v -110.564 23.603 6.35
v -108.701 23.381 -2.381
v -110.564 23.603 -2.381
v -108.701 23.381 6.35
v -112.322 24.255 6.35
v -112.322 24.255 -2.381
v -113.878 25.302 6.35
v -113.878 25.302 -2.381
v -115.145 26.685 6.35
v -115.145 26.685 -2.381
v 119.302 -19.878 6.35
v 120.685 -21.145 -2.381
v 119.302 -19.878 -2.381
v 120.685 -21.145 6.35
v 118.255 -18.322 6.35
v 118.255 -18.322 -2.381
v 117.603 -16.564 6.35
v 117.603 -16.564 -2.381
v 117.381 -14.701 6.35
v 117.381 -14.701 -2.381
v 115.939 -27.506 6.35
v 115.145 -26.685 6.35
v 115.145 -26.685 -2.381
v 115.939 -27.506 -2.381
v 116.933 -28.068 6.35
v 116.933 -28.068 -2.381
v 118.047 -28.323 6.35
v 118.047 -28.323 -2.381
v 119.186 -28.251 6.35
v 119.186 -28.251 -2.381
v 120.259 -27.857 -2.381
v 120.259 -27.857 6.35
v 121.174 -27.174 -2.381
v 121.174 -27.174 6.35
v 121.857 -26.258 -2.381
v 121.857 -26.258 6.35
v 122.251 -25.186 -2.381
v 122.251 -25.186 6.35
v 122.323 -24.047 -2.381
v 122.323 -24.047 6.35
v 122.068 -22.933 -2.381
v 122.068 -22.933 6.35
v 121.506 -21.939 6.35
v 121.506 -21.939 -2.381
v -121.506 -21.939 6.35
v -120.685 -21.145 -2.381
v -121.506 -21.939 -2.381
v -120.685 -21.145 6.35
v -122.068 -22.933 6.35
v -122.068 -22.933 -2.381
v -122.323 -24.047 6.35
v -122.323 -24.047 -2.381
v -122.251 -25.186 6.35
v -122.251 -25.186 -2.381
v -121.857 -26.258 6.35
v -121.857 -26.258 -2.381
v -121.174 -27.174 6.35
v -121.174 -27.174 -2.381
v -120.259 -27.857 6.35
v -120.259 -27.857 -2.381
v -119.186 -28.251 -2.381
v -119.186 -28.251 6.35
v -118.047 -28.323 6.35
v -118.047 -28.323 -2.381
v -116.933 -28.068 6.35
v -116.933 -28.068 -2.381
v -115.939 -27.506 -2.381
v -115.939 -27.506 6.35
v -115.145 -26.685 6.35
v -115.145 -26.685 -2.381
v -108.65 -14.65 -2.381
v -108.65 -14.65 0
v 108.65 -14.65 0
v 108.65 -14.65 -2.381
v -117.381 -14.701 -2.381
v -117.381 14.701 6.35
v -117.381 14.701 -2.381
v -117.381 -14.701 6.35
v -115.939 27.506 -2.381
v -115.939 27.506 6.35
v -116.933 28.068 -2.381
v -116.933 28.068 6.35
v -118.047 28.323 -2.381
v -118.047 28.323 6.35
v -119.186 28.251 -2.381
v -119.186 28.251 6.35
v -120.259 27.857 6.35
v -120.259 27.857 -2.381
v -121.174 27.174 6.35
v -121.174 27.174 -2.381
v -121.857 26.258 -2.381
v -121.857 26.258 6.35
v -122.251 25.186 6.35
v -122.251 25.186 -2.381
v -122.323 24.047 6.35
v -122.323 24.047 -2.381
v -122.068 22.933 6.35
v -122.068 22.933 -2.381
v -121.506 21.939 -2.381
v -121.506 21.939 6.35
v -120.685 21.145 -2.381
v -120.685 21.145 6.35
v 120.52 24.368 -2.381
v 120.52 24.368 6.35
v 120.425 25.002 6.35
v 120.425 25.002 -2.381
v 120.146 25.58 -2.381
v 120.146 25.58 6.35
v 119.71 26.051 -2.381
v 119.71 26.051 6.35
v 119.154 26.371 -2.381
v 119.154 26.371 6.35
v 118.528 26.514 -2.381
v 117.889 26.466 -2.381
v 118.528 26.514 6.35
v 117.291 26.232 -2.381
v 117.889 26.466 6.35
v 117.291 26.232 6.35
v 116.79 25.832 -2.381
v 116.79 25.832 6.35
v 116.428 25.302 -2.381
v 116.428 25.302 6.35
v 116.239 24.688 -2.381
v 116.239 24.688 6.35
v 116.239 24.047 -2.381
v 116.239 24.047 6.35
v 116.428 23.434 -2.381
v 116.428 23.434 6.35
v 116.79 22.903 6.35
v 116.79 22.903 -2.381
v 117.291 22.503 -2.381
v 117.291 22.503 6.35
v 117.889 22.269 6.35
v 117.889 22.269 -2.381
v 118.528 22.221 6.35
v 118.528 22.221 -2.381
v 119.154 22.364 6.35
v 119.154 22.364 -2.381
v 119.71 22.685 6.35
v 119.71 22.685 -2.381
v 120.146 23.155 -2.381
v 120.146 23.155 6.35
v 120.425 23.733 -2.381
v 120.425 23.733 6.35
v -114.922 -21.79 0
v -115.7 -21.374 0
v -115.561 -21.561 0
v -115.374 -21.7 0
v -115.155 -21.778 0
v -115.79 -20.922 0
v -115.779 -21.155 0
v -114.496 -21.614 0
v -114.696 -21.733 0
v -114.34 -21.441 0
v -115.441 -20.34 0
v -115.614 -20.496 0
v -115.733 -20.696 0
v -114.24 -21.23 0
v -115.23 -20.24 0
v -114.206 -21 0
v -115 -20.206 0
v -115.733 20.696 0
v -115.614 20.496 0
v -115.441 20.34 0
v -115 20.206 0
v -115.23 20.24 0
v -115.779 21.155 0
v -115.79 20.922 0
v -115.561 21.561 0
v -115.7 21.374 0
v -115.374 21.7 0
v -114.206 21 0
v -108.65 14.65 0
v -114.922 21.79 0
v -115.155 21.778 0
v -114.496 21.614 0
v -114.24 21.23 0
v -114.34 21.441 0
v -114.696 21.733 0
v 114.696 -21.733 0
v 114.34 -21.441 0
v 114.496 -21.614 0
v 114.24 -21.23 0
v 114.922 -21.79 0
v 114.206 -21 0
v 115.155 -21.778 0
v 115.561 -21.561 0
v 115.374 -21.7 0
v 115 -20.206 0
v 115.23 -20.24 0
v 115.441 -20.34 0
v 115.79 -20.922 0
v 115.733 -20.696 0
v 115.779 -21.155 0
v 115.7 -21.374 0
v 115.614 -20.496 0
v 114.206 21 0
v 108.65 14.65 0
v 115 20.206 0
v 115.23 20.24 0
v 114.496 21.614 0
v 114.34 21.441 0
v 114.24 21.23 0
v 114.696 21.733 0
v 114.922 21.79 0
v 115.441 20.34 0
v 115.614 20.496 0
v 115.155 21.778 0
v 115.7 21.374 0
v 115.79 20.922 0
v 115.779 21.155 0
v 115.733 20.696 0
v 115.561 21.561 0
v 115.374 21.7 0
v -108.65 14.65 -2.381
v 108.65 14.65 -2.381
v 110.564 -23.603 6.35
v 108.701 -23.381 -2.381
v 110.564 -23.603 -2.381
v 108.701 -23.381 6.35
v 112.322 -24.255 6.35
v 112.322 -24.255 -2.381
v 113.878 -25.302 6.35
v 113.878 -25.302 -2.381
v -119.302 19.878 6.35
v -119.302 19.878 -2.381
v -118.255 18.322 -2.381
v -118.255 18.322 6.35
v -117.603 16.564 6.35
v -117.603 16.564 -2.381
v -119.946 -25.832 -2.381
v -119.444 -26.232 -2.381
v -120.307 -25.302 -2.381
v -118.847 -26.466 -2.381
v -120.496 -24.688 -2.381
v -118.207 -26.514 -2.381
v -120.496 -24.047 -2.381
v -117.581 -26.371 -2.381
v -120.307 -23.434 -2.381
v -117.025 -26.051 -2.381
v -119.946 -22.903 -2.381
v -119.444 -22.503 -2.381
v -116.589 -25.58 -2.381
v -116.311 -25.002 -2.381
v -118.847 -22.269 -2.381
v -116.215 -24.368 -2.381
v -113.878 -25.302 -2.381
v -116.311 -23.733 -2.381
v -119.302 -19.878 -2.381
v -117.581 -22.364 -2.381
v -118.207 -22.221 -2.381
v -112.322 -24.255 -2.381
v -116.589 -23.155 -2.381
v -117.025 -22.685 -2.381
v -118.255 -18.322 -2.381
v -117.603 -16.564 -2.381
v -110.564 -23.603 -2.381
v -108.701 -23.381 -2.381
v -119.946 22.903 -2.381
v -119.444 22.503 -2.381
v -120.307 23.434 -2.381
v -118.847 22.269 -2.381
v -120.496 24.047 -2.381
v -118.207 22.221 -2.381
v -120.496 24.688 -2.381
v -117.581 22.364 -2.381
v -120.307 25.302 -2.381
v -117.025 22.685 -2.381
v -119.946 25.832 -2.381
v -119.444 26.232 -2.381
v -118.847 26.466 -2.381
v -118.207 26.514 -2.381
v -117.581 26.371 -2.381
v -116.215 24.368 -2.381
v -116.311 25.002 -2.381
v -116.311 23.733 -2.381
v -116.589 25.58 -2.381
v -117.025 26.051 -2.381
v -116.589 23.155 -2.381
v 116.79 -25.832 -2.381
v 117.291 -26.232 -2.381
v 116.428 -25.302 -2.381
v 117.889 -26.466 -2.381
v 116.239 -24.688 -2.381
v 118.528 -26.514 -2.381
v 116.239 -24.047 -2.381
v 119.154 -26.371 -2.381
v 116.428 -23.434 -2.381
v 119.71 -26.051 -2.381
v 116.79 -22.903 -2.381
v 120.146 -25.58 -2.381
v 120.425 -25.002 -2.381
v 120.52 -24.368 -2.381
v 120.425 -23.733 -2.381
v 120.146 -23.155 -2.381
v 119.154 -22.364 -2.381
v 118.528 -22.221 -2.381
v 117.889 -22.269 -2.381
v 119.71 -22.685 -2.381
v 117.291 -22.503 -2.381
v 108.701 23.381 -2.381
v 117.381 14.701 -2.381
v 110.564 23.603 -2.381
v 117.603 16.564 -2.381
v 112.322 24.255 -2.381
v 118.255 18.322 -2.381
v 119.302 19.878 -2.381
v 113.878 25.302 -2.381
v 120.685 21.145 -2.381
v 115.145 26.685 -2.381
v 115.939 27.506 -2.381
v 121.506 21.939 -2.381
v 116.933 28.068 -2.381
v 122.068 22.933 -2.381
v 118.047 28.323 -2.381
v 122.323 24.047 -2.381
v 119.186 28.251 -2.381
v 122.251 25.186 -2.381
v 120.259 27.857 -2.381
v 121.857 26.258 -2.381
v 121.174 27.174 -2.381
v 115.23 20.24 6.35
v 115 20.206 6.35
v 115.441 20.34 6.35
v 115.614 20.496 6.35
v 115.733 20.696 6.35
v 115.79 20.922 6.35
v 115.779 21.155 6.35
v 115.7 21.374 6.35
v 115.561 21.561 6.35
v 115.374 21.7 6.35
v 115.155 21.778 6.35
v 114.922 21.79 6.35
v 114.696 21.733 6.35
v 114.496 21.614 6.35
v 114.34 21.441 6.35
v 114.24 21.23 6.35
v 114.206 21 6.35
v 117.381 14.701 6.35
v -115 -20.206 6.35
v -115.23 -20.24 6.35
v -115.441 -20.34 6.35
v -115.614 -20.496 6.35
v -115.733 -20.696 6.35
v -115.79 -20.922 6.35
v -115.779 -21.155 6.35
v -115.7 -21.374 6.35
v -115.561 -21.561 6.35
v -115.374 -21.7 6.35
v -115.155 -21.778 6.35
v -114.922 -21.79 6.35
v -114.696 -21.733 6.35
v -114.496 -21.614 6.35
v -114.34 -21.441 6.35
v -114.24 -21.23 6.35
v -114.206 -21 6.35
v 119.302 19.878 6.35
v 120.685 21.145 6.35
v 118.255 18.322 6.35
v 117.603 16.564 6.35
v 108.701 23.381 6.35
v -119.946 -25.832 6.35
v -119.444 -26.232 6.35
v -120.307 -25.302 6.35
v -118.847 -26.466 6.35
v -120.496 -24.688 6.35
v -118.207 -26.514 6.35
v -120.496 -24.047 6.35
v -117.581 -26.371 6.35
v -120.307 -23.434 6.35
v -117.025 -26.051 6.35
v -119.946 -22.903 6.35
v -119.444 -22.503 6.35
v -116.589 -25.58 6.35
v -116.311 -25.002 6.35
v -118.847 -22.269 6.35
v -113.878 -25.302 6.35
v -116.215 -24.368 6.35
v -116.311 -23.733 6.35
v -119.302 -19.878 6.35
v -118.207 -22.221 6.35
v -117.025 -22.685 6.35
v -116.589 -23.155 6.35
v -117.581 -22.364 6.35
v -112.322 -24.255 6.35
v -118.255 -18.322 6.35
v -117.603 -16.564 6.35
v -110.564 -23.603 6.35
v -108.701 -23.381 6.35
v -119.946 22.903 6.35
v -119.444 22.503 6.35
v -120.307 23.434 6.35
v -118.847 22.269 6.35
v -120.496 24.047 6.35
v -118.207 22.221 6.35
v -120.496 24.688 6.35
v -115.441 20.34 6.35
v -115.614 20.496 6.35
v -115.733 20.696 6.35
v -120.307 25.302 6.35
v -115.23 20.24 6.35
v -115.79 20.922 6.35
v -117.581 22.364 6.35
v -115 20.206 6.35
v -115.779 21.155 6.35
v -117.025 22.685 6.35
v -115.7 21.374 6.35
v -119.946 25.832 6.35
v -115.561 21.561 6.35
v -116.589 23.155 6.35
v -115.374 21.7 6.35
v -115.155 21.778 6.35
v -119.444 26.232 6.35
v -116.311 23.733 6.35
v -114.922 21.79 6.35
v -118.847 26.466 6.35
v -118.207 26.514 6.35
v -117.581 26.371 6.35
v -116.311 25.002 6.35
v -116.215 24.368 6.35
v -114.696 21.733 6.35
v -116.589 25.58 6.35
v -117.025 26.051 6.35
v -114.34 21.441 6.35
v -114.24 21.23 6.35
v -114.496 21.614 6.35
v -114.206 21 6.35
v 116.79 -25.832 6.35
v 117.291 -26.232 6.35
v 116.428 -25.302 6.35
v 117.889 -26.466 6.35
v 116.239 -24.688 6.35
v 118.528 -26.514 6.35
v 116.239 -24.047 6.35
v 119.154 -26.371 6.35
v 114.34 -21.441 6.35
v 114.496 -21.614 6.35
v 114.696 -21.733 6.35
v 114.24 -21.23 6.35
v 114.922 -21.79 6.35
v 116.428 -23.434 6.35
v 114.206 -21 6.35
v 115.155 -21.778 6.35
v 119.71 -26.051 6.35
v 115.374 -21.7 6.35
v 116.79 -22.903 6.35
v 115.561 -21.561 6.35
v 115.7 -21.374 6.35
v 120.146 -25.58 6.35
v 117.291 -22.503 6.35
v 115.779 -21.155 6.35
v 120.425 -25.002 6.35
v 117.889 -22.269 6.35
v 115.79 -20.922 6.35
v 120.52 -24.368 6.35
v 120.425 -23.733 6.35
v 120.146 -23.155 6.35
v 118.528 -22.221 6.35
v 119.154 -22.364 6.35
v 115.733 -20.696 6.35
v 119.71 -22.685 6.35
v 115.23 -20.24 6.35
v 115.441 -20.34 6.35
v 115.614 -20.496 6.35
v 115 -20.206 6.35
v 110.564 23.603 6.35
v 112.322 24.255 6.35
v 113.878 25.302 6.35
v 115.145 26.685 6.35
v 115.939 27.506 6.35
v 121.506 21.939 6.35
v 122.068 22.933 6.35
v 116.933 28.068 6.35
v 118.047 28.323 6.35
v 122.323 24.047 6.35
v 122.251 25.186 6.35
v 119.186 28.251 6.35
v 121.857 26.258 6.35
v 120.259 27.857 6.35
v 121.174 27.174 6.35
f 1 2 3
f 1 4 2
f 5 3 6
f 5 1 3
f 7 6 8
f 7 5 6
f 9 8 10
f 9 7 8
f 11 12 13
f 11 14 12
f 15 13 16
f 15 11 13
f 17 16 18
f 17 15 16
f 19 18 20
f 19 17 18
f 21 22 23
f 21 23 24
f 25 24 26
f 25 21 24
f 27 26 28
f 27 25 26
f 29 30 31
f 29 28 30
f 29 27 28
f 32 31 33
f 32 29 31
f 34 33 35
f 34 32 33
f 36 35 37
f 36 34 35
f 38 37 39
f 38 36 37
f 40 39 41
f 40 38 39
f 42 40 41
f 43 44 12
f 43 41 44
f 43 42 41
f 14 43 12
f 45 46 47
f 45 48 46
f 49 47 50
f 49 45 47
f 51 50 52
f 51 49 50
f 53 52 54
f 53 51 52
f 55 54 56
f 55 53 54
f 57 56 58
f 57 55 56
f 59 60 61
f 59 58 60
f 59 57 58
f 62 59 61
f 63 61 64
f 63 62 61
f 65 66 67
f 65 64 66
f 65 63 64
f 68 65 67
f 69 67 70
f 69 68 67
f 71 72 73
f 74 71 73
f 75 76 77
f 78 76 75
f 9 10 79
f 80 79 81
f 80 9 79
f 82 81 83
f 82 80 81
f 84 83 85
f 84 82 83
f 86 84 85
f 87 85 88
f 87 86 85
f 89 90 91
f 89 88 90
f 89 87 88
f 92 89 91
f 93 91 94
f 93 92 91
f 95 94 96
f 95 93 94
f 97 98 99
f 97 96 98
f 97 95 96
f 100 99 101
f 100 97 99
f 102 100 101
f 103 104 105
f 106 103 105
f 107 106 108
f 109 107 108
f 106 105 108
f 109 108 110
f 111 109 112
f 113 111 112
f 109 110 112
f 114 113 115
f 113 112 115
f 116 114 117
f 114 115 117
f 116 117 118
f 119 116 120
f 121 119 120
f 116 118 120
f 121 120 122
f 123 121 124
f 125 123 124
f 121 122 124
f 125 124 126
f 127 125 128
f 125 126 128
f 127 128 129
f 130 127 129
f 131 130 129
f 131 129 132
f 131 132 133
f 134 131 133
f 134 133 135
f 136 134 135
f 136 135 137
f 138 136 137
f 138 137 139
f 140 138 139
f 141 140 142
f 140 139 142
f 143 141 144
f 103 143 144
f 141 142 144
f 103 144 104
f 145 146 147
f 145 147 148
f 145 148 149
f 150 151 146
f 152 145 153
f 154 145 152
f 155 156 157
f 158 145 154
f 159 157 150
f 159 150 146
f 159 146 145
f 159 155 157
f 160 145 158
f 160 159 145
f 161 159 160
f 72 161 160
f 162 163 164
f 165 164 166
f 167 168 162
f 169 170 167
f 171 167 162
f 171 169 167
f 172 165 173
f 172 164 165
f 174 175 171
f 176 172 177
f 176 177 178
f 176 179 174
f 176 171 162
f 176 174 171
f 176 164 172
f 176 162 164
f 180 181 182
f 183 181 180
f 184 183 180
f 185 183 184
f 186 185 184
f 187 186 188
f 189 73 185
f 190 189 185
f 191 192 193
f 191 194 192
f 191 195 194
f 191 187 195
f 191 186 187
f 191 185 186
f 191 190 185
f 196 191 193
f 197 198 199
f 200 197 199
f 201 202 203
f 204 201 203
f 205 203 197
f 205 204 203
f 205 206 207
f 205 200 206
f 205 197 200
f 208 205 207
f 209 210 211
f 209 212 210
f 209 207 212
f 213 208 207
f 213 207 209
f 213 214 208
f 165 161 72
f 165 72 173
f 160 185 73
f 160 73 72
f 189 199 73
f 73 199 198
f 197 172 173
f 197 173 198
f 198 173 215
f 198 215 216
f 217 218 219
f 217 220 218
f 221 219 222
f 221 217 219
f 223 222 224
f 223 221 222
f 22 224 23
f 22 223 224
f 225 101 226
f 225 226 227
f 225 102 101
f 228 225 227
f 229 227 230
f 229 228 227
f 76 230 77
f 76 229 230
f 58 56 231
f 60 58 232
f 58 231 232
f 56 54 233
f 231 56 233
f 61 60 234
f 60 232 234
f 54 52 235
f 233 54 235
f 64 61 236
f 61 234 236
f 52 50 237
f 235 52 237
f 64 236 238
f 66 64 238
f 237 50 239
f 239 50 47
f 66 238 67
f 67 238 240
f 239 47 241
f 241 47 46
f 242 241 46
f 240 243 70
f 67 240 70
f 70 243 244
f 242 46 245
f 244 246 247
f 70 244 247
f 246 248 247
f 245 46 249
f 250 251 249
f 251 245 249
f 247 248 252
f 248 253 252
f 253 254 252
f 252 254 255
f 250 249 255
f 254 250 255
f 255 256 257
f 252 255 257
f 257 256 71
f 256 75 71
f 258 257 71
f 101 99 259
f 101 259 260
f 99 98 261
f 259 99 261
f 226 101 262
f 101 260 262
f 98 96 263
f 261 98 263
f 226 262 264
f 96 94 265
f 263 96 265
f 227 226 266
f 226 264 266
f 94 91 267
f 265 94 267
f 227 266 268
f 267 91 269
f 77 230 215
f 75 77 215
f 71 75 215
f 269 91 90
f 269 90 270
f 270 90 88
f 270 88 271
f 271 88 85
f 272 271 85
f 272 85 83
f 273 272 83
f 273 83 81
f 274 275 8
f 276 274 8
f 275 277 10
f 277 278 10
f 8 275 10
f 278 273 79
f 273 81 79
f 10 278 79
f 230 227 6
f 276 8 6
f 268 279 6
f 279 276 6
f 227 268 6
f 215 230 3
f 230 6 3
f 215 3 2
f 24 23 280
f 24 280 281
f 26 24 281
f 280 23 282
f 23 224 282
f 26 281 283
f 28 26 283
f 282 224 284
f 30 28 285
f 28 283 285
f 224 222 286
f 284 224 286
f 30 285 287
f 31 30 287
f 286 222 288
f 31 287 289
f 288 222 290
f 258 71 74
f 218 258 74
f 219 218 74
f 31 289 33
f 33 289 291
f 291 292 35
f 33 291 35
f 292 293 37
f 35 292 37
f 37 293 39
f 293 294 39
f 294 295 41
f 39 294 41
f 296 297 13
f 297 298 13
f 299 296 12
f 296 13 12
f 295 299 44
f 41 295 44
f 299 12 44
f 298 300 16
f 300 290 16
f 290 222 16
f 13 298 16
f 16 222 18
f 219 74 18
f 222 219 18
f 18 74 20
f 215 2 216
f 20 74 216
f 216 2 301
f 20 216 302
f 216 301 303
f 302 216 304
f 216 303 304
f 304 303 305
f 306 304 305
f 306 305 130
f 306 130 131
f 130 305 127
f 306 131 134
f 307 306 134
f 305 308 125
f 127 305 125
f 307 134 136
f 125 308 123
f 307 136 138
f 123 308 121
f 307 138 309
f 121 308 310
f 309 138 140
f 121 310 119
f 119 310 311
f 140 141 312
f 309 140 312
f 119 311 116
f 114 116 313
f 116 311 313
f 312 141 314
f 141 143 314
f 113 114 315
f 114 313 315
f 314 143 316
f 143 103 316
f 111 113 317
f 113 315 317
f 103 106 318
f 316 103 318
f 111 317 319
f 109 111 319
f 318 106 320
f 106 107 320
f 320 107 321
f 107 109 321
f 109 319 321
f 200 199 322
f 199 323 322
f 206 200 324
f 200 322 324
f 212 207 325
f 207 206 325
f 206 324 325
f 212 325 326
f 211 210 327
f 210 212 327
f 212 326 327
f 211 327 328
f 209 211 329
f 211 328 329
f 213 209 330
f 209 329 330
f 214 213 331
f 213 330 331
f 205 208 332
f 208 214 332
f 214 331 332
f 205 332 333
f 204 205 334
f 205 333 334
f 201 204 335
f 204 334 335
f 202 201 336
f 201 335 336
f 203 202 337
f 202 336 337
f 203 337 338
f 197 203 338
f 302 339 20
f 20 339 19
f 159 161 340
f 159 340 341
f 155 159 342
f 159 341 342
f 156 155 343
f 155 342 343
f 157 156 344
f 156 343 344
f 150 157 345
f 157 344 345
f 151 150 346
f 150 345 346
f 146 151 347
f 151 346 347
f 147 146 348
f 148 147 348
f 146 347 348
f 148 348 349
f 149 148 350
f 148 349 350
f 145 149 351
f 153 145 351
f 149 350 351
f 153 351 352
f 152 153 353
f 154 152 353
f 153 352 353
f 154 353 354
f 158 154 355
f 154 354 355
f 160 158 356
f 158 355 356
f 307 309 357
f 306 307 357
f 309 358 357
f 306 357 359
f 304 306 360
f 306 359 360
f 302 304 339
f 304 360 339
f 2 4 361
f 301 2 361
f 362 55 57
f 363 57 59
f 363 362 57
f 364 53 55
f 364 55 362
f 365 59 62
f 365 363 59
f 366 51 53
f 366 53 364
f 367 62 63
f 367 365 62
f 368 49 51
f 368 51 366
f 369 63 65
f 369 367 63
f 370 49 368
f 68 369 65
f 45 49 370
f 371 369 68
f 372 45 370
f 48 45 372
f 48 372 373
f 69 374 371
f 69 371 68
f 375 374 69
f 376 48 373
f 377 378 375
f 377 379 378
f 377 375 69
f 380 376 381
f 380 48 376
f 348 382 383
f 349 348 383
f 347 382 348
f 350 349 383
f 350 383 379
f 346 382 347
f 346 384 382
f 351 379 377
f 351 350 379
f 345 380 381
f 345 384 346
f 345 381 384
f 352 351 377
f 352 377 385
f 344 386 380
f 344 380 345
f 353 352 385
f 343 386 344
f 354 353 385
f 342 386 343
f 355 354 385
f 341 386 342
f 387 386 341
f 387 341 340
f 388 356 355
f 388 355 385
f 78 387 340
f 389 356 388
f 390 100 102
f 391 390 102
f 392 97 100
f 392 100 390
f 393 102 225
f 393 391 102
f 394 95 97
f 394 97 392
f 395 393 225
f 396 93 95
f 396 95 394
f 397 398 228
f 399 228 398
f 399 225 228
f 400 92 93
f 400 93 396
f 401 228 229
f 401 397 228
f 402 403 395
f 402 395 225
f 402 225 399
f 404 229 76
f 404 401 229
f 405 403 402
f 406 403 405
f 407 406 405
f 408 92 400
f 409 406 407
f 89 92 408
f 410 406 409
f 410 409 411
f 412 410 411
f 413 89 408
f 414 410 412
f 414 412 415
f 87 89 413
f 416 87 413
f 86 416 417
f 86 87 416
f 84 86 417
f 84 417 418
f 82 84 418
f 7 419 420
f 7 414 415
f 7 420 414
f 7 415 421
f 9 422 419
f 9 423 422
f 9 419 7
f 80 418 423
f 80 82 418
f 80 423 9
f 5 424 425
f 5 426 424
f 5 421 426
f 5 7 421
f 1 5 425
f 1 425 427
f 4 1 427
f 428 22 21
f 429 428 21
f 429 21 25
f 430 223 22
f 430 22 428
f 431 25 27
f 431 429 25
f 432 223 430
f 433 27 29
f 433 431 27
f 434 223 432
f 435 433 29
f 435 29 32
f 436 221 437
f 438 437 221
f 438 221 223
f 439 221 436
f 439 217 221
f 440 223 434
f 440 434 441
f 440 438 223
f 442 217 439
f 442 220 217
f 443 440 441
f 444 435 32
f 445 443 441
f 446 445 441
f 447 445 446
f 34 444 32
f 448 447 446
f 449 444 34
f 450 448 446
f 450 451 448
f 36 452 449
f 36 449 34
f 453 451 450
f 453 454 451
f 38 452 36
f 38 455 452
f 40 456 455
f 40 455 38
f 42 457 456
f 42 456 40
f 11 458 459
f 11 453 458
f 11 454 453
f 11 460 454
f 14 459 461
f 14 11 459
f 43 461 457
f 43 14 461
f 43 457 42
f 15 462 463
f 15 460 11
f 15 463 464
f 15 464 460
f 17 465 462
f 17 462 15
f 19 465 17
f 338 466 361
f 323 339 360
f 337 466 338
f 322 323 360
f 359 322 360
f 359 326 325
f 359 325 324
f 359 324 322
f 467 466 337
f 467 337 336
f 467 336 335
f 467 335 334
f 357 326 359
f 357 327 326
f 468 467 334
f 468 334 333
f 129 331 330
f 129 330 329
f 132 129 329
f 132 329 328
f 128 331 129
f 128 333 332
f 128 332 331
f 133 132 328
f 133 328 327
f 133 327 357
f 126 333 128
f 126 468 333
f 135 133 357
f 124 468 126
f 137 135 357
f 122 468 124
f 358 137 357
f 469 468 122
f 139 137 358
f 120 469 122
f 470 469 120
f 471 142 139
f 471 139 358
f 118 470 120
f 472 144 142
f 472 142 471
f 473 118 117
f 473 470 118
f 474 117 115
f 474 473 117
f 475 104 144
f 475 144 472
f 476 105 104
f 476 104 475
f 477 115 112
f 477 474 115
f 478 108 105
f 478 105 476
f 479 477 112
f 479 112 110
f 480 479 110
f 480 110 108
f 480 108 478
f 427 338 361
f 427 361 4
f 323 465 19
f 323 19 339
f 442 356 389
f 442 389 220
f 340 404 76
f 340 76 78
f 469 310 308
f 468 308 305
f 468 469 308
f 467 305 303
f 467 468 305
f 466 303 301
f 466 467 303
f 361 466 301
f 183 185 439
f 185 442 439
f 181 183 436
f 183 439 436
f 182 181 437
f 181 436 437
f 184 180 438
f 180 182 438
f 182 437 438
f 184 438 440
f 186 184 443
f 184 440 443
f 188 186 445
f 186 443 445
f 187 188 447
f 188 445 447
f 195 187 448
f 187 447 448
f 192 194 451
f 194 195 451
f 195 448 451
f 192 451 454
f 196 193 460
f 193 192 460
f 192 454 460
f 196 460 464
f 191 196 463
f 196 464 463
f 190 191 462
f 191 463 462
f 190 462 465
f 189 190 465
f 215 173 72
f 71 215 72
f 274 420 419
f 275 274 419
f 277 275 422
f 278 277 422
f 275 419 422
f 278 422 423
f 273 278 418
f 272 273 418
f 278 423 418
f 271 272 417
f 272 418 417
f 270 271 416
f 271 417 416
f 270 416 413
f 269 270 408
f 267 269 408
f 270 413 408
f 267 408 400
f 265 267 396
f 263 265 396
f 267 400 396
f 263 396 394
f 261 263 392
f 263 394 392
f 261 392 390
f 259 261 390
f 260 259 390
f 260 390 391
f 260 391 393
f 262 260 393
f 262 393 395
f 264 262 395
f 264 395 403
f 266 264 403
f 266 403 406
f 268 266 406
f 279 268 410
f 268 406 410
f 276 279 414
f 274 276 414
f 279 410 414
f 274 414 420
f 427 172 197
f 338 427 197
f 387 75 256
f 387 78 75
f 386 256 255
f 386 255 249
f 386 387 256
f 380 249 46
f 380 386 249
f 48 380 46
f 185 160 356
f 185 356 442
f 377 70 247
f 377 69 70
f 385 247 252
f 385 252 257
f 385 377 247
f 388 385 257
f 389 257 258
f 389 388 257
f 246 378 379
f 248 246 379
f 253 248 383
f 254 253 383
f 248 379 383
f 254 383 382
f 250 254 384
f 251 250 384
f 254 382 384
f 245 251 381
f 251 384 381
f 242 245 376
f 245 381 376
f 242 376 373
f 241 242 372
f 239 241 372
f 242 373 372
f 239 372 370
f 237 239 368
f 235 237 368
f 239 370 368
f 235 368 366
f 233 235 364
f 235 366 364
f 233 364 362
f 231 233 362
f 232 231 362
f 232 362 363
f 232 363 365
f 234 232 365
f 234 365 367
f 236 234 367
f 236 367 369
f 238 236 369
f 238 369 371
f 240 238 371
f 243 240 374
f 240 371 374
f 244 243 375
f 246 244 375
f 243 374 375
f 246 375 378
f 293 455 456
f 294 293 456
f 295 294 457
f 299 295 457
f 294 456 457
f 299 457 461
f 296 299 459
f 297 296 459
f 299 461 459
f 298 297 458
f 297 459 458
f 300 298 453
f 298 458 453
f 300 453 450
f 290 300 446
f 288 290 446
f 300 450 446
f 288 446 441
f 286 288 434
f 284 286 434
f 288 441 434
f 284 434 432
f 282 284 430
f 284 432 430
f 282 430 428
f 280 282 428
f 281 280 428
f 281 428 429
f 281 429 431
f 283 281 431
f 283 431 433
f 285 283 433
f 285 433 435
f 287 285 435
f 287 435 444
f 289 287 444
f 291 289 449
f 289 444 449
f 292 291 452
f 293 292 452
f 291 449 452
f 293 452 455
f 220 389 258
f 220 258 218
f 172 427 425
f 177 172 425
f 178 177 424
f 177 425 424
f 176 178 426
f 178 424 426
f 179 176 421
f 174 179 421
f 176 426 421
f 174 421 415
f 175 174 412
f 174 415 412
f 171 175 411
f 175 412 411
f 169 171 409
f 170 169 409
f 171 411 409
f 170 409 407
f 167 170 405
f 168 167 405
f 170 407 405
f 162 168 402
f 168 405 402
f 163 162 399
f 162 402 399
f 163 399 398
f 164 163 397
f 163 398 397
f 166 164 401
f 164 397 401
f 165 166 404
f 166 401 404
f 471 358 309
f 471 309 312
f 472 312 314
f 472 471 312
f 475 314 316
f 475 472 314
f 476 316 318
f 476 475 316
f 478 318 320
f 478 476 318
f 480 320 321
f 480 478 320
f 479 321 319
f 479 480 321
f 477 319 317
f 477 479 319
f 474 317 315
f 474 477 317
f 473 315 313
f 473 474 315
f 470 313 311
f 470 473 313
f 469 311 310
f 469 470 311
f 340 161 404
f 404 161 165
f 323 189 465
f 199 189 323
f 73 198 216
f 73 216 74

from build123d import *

# Parameters (mm, degrees)
F0_W      = 234.762548
F0_H      = 46.762416
F0_W_2    = 230.000048
F0_H_2    = 41.999916
F1_DEPTH  = 6.35
F2_W      = 234.762548
F2_H      = 46.762416
F2_W_2    = 217.300048
F2_H_2    = 29.299916
F3_DEPTH  = 2.38125
F4_R      = 3.96875
F5_DEPTH  = 8.73125
F6_R      = 7.9375
F7_R      = 2.15265
F8_DEPTH  = 8.73125
F9_R      = 0.79375
F10_DEPTH = 6.35


with BuildPart() as f1:
    # F0 (on Top) → F1 (new body)
    with BuildSketch(Plane.XY):
        Rectangle(F0_W, F0_H)
        Rectangle(F0_W_2, F0_H_2, mode=Mode.SUBTRACT)
    extrude(amount=F1_DEPTH)

    # F2 (on face) → F3 (join)
    with BuildSketch(Plane(origin=(0, 0, 0), x_dir=(1, 0, 0), z_dir=(0, 0, -1))):
        Rectangle(F2_W, F2_H)
        Rectangle(F2_W_2, F2_H_2, mode=Mode.SUBTRACT)
    extrude(amount=F3_DEPTH)

    # F4 (on face) → F5 (join, through all)
    with BuildSketch(Plane.XY.offset(6.35)):
        with Locations((118.36762, 24.367554)):
            Circle(F4_R)
        with Locations((118.36762, -24.367554)):
            Circle(F4_R)
        with Locations((-118.36762, -24.367554)):
            Circle(F4_R)
        with Locations((-118.36762, 24.367554)):
            Circle(F4_R)
    extrude(amount=-F5_DEPTH)

    # F6
    f6_edges = [f1.edges().sort_by_distance(p)[0] for p in [
        (114.523391, 23.381208, 1.984375),
        (117.381274, 20.523325, 1.984375),
        (117.381274, -20.523325, 1.984375),
        (114.523391, -23.381208, 1.984375),
        (-117.381274, -20.523325, 1.984375),
        (-114.523391, -23.381208, 1.984375),
        (-114.523391, 23.381208, 1.984375),
        (-117.381274, 20.523325, 1.984375),
    ]]
    fillet(f6_edges, radius=F6_R)

    # F7 (on face) → F8 (cut, through all)
    with BuildSketch(Plane.XY.offset(6.35)):
        with Locations((118.36762, 24.367554)):
            Circle(F7_R)
        with Locations((118.36762, -24.367554)):
            Circle(F7_R)
        with Locations((-118.36762, 24.367554)):
            Circle(F7_R)
        with Locations((-118.36762, -24.367554)):
            Circle(F7_R)
    extrude(amount=-F8_DEPTH, mode=Mode.SUBTRACT)

    # F9 (on face) → F10 (cut, through all)
    with BuildSketch(Plane.XY.offset(6.35)):
        with Locations((-115.000024, 20.999958)):
            Circle(F9_R)
        with Locations((-115.000024, -20.999958)):
            Circle(F9_R)
        with Locations((115.000024, 20.999958)):
            Circle(F9_R)
        with Locations((115.000024, -20.999958)):
            Circle(F9_R)
    extrude(amount=-F10_DEPTH, mode=Mode.SUBTRACT)


solid = f1.part
